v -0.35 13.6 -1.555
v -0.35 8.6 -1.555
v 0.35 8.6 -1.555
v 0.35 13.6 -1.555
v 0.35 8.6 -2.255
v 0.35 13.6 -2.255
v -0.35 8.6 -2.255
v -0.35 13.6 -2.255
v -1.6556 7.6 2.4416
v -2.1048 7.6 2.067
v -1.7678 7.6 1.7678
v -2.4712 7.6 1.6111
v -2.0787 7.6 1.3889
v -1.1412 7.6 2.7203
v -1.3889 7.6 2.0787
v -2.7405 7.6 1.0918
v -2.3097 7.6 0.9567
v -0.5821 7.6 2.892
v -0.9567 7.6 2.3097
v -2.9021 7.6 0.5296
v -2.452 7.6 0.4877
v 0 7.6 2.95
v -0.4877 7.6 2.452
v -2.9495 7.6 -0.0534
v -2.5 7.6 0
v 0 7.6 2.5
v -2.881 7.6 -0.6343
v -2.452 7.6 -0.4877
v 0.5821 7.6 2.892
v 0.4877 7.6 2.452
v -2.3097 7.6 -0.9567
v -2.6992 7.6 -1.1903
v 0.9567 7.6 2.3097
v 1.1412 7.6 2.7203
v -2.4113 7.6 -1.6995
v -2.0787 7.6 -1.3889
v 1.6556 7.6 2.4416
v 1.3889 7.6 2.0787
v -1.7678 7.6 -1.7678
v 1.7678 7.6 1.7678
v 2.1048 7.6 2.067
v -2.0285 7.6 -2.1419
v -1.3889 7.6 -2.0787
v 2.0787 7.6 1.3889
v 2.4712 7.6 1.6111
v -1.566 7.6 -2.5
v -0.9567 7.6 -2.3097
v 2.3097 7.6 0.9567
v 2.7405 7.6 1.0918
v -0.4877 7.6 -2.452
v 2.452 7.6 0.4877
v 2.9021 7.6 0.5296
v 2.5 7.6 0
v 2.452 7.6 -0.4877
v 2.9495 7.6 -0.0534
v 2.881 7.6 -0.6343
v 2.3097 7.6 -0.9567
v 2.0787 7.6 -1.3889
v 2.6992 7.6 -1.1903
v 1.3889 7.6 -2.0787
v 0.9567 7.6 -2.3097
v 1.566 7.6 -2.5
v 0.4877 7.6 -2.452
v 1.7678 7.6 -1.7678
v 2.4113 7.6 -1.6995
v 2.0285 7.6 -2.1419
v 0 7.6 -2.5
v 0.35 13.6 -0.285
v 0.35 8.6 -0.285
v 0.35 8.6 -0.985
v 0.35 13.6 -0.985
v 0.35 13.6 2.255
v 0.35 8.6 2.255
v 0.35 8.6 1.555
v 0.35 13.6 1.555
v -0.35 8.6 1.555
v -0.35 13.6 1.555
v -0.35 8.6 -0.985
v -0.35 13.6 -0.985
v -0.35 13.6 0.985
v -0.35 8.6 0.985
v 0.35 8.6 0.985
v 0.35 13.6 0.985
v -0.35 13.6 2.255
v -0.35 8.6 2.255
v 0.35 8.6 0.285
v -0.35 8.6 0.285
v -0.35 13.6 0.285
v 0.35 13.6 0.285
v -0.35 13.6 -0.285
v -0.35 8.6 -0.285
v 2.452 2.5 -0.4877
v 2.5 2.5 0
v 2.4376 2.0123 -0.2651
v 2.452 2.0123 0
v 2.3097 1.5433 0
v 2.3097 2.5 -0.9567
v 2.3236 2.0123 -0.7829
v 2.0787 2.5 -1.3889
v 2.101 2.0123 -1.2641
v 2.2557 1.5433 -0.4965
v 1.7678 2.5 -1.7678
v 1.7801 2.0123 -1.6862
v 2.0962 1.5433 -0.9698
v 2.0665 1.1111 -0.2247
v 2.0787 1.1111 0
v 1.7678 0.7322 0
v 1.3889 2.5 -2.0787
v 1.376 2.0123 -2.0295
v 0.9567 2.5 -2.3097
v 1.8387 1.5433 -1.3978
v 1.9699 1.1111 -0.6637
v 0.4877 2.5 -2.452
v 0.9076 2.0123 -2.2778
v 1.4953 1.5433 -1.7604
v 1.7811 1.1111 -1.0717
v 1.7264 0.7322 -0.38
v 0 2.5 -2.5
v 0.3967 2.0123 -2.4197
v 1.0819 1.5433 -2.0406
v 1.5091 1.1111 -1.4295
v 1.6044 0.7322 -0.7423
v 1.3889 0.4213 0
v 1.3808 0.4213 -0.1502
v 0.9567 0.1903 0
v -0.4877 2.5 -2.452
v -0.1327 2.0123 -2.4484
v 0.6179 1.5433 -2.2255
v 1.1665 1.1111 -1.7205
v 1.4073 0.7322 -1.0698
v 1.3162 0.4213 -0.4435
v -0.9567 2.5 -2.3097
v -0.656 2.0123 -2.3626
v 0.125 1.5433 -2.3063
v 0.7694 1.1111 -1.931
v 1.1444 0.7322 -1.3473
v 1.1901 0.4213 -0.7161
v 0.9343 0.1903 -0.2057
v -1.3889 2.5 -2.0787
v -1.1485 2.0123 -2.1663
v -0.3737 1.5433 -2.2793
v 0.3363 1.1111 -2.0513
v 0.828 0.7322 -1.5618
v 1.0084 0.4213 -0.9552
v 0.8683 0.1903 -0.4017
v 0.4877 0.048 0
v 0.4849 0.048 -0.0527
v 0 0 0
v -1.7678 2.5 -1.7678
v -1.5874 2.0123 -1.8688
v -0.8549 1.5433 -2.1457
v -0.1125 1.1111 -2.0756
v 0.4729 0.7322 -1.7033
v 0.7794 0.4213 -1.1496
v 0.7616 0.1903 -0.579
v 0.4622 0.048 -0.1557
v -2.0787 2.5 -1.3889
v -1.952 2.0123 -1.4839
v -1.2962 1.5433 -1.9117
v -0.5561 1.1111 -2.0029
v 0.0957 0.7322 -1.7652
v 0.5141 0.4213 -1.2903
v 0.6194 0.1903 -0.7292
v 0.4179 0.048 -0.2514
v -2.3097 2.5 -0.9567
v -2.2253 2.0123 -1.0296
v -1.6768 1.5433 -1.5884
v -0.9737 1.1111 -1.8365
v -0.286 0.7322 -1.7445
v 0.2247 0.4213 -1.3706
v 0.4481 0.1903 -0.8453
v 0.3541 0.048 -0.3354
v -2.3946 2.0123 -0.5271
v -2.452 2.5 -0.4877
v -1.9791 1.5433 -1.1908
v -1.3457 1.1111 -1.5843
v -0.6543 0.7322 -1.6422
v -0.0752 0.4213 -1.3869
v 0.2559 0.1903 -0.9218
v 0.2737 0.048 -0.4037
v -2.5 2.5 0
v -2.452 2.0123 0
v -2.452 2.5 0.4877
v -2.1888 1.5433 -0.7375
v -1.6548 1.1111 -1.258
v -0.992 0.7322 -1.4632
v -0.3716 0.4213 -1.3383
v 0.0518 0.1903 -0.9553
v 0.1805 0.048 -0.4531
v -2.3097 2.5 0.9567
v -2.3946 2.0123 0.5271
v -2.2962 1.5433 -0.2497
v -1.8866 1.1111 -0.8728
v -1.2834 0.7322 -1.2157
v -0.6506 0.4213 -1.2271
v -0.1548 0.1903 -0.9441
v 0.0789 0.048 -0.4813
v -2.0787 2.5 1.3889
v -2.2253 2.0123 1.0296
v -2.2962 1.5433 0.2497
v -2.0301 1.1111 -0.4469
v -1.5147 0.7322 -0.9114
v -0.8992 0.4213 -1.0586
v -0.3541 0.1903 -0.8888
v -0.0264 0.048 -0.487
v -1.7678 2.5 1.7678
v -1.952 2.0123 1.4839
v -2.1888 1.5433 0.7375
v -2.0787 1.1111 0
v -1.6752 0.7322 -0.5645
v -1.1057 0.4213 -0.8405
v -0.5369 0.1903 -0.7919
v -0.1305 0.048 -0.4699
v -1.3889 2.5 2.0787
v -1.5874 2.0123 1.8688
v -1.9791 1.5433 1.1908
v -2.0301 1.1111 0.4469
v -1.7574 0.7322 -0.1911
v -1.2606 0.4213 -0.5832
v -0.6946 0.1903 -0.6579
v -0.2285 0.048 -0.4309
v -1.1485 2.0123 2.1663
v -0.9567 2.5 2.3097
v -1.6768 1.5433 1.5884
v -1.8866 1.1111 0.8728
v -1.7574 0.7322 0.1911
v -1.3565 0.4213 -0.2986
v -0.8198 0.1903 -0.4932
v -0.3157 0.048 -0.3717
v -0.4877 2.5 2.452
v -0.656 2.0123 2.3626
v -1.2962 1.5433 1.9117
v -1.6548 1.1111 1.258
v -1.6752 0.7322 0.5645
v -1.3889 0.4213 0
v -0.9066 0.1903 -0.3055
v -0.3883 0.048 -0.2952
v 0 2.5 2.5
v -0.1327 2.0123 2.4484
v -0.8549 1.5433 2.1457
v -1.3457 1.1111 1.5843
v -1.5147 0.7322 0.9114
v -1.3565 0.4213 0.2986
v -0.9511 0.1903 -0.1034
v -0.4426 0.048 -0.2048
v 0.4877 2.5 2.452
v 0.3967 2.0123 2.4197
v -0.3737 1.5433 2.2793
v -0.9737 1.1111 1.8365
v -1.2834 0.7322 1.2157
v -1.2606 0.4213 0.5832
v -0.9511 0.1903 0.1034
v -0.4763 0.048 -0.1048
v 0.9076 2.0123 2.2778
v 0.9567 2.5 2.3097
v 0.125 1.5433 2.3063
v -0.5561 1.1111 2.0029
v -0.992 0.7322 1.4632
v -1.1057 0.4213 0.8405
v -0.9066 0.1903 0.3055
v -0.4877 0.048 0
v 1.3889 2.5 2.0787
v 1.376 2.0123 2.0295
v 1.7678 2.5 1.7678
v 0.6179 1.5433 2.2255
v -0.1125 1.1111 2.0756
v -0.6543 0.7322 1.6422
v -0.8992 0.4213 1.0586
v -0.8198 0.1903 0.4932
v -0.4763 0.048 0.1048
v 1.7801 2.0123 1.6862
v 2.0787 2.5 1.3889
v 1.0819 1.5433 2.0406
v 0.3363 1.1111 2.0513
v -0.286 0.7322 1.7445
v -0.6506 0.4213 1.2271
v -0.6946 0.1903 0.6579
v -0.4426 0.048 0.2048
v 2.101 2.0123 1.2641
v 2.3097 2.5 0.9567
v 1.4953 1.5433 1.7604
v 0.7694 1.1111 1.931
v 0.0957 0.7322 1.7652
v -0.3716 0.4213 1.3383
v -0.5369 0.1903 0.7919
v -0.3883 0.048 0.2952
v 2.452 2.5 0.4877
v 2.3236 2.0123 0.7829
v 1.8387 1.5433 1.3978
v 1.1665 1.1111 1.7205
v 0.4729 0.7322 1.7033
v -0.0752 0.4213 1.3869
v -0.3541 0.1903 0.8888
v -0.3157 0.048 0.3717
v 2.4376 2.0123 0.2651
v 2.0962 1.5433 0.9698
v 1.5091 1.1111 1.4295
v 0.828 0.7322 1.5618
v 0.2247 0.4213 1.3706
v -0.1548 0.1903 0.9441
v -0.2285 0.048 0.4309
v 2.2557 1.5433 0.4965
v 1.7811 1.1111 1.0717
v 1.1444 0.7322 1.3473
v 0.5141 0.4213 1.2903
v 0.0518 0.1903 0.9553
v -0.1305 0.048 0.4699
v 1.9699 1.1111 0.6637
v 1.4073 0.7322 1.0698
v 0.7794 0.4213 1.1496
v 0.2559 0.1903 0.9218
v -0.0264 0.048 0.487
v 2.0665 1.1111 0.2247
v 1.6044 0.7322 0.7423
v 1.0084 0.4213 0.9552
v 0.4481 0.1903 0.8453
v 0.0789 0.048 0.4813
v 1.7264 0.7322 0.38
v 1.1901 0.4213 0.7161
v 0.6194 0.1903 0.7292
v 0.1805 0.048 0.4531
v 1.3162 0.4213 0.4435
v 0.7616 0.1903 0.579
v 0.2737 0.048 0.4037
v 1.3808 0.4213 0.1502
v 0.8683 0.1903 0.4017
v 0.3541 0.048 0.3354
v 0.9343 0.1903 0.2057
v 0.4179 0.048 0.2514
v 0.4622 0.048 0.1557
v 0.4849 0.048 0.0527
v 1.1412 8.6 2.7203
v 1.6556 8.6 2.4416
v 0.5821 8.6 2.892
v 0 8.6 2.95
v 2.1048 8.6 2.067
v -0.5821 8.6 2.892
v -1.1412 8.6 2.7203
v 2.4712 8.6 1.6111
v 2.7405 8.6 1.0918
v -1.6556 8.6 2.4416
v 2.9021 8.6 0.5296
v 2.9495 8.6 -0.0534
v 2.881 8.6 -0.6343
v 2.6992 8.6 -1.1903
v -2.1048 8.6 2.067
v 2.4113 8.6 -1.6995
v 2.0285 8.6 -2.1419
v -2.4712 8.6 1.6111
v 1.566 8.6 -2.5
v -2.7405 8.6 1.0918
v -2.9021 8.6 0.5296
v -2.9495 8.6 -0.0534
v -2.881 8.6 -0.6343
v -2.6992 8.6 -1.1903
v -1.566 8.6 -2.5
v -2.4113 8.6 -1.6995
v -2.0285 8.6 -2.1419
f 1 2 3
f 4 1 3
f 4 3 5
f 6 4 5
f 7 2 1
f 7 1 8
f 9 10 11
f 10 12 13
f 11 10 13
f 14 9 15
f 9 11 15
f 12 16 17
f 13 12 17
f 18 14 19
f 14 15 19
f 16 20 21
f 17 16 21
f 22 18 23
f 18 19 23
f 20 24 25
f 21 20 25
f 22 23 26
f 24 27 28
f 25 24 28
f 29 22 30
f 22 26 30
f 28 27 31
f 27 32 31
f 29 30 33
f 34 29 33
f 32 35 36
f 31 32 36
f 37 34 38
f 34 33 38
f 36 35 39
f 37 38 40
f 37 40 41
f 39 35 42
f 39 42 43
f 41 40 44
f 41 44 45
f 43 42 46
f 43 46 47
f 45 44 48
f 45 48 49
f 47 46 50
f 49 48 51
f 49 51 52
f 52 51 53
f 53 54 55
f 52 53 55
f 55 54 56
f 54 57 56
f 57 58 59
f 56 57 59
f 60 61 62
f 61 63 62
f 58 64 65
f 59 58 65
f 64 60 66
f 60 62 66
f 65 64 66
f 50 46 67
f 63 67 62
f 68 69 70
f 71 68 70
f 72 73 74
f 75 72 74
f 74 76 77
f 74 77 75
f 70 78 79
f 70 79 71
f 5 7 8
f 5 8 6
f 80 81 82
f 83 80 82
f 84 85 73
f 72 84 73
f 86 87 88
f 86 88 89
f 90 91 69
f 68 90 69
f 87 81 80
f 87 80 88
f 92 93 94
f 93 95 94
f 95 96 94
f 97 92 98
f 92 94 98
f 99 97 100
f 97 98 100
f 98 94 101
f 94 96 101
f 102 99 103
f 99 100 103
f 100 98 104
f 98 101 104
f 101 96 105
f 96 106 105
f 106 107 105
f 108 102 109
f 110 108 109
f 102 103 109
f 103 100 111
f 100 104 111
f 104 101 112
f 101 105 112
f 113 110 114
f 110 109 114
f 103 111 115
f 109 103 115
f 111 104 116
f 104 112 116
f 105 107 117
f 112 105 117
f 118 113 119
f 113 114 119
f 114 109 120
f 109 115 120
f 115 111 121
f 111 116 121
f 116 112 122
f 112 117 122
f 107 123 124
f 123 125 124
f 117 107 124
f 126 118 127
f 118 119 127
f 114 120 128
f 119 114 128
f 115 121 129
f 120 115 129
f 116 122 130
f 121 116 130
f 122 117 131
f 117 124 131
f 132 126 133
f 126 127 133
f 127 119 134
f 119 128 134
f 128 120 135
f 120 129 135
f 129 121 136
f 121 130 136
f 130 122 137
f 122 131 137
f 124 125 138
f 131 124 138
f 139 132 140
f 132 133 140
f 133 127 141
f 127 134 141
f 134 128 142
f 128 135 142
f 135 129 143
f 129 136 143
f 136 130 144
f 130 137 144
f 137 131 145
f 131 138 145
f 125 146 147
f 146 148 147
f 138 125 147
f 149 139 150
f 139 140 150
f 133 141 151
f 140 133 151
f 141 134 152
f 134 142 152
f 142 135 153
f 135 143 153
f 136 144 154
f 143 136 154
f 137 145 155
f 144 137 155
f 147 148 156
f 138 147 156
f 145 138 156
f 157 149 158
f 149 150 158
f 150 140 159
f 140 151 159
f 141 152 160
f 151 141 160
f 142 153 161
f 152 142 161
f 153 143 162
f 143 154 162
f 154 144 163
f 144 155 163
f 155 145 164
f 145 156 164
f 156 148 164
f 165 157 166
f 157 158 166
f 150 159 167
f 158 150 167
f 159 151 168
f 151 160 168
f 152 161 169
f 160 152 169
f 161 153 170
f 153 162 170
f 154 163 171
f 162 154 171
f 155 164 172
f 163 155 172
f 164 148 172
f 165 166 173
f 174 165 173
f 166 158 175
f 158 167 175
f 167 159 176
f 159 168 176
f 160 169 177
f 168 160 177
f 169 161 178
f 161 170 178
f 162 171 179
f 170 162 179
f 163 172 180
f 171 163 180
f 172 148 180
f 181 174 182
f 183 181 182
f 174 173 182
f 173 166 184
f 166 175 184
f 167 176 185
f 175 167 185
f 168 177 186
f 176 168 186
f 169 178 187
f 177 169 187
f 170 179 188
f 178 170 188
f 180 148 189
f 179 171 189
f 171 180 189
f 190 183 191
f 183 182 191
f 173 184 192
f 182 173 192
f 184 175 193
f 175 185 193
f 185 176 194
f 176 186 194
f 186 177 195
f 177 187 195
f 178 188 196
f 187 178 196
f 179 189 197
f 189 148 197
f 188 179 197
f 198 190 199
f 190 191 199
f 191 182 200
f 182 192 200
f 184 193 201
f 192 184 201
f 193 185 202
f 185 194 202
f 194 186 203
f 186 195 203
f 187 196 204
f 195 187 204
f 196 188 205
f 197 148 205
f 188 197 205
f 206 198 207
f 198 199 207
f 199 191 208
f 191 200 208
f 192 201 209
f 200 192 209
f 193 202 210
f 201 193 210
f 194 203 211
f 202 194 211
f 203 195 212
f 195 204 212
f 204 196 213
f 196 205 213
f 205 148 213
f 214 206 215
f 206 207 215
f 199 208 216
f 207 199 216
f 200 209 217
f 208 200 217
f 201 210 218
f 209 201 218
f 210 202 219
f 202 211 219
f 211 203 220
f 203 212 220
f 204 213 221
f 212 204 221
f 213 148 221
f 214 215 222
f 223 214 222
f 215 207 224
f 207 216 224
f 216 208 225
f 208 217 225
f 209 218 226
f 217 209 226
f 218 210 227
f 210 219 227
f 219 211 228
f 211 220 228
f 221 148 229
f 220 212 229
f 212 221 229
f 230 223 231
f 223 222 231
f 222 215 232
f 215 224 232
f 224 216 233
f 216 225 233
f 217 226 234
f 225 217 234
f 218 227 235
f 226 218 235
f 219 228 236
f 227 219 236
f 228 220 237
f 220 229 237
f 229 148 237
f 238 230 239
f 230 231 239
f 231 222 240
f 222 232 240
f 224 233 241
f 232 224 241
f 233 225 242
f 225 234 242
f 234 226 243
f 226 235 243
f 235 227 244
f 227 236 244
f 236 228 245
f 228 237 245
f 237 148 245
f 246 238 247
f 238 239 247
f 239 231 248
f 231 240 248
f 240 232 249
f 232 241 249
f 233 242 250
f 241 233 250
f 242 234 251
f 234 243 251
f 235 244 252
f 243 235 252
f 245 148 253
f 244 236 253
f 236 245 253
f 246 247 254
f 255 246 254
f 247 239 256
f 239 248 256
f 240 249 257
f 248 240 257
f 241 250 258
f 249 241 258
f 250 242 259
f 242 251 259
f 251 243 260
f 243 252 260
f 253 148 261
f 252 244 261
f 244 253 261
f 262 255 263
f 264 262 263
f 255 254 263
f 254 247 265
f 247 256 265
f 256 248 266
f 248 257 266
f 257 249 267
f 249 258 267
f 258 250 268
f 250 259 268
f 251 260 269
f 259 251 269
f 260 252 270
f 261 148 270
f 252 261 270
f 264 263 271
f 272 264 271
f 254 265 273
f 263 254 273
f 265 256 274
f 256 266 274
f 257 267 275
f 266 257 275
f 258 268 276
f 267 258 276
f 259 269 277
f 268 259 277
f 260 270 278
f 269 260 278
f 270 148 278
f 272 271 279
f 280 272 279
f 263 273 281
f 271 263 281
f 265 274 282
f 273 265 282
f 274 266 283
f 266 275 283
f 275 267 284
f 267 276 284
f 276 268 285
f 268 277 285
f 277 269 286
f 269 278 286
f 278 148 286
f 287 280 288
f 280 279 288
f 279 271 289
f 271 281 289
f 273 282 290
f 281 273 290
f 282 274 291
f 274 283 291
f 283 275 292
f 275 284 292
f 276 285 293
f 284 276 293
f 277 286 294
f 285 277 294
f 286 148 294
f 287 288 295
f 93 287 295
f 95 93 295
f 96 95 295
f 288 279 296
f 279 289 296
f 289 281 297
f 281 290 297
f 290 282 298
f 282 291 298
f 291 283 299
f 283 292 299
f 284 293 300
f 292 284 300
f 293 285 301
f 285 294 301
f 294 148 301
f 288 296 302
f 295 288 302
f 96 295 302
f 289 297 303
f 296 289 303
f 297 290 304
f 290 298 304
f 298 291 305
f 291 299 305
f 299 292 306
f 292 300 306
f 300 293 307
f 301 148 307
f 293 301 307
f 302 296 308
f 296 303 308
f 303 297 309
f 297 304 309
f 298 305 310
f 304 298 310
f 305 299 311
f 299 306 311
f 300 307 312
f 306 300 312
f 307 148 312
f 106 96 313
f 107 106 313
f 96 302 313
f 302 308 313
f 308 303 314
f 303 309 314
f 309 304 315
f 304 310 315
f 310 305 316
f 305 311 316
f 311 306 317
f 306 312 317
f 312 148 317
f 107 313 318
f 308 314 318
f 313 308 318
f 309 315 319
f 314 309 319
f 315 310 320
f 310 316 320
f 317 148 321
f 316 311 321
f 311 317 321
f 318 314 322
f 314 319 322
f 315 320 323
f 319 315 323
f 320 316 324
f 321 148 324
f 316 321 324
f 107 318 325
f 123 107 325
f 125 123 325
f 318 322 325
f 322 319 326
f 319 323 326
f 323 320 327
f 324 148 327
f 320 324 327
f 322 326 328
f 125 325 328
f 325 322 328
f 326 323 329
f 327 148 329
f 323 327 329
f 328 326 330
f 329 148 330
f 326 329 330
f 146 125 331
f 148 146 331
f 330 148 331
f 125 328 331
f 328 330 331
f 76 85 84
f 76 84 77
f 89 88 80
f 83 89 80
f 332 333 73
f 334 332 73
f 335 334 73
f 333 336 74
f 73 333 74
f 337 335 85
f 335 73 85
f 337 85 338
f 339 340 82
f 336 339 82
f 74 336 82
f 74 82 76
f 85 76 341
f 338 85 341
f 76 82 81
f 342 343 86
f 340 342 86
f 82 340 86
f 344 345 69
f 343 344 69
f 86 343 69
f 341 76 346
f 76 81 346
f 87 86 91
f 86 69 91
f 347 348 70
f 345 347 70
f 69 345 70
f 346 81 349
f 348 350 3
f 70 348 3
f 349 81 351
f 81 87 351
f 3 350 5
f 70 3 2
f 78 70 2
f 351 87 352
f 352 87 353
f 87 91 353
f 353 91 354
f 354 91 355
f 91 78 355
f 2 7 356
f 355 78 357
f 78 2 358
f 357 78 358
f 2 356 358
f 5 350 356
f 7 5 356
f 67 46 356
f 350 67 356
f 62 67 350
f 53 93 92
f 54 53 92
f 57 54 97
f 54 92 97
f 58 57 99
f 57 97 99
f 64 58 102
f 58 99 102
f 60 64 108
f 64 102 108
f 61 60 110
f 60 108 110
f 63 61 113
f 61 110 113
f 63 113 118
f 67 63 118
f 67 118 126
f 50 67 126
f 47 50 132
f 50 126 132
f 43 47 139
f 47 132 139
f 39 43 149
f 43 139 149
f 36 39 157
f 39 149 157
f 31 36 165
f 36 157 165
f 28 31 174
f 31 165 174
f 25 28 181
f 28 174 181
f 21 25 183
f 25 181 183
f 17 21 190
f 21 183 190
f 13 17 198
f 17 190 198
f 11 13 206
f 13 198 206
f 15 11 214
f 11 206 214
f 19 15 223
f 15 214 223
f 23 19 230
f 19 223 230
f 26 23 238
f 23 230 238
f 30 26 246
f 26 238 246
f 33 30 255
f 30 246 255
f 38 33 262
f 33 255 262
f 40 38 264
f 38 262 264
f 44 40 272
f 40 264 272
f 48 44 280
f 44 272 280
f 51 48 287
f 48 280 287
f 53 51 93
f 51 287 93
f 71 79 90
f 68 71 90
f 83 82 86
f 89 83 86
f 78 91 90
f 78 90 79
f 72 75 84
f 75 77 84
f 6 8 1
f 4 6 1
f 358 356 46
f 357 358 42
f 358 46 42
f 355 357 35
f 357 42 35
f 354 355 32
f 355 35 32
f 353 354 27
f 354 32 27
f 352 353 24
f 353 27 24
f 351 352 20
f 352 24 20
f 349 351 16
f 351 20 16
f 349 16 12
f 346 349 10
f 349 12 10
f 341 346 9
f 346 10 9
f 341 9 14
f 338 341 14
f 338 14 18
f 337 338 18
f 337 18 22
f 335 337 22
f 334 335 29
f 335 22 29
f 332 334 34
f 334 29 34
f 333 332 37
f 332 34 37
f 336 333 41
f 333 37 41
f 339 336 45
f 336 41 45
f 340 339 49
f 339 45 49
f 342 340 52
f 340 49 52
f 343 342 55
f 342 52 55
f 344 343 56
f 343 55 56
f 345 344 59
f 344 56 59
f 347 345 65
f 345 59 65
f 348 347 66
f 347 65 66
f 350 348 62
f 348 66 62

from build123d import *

# Parameters (mm, degrees)
ENL_V_MAT_EXTRU_1_REACH = 10.67
ESQUISSE3_W             = 0.7
ESQUISSE3_H             = 0.7
BOSS_EXTRU_1_DEPTH      = 24.5
ENL_V_START             = -3.3
ENL_V_MAT_EXTRU_2_DEPTH = 5.9
SKETCH1_W               = 4.51
SKETCH1_H               = 19.5
CUT_EXTRUDE1_DEPTH      = 34.394647775


with BuildPart() as part:
    # Esquisse1 → Révolution1 (revolve)
    with BuildSketch(Plane.XY):
        with BuildLine():
            Line((2.5, 7.6), (2.5, 2.5))
            ThreePointArc((2.5, 2.5), (1.767766953, 0.732233047), (0, 0))
            Line((0, 0), (0, 8.6))
            Line((0, 8.6), (2.95, 8.6))
            Line((2.95, 8.6), (2.95, 7.6))
            Line((2.95, 7.6), (2.5, 7.6))
        make_face()
    revolve(axis=Axis((0, 0, 0), (0, 1, 0)))

    # Esquisse2 → Enlèv. mat.-Extru.1 (cut, up to next)
    with BuildSketch(Plane(origin=(0, 7.6, 0), x_dir=(-1, 0, 0), z_dir=(0, -1, 0)), mode=Mode.PRIVATE) as enl_v_mat_extru_1_sk1:
        Polygon((2.031643218, 2.5), (-2.119175806, 2.5), (-0.304277426, 5.41579693), align=None)
    enl_v_mat_extru_1_tool1 = extrude(enl_v_mat_extru_1_sk1.sketch, amount=-ENL_V_MAT_EXTRU_1_REACH, mode=Mode.PRIVATE) & part.part
    add(enl_v_mat_extru_1_tool1.solids().sort_by_distance((0.130603, 7.6, -3.471932))[0], mode=Mode.SUBTRACT)

    # Esquisse3 → Boss.-Extru.1 (add)
    with BuildSketch(Plane(origin=(0, 8.6, 0), x_dir=(1, 0, 0), z_dir=(0, 1, 0))):
        with Locations((0, 1.905)):
            Rectangle(ESQUISSE3_W, ESQUISSE3_H)
        with Locations((0, -0.635)):
            Rectangle(ESQUISSE3_W, ESQUISSE3_H)
        with Locations((0, -1.905)):
            Rectangle(ESQUISSE3_W, ESQUISSE3_H)
        with Locations((0, 0.635)):
            Rectangle(ESQUISSE3_W, ESQUISSE3_H)
    extrude(amount=BOSS_EXTRU_1_DEPTH)

    # Esquisse4 → Enlèv. mat.-Extru.2 (cut)
    with BuildSketch(Plane.ZY.offset(0.35).offset(ENL_V_START)):
        Polygon((-2.885095567, 30.6), (-1.265657514, 30.6), (-1.265657514, 33.921907916), (0, 33.921907916), (0, 31.83), (1.344412991, 31.83), (1.344412991, 30.6), (2.897512796, 30.6), (2.897512796, 34.676886987), (-2.885095567, 34.676886987), align=None)
    extrude(amount=ENL_V_MAT_EXTRU_2_DEPTH, mode=Mode.SUBTRACT)

    # Sketch1 → Cut-Extrude1 (cut, through all)
    with BuildSketch(Plane.ZY.offset(0.35)):
        with Locations((0, 23.35)):
            Rectangle(SKETCH1_W, SKETCH1_H)
    extrude(amount=-CUT_EXTRUDE1_DEPTH, mode=Mode.SUBTRACT)


solid = part.part
